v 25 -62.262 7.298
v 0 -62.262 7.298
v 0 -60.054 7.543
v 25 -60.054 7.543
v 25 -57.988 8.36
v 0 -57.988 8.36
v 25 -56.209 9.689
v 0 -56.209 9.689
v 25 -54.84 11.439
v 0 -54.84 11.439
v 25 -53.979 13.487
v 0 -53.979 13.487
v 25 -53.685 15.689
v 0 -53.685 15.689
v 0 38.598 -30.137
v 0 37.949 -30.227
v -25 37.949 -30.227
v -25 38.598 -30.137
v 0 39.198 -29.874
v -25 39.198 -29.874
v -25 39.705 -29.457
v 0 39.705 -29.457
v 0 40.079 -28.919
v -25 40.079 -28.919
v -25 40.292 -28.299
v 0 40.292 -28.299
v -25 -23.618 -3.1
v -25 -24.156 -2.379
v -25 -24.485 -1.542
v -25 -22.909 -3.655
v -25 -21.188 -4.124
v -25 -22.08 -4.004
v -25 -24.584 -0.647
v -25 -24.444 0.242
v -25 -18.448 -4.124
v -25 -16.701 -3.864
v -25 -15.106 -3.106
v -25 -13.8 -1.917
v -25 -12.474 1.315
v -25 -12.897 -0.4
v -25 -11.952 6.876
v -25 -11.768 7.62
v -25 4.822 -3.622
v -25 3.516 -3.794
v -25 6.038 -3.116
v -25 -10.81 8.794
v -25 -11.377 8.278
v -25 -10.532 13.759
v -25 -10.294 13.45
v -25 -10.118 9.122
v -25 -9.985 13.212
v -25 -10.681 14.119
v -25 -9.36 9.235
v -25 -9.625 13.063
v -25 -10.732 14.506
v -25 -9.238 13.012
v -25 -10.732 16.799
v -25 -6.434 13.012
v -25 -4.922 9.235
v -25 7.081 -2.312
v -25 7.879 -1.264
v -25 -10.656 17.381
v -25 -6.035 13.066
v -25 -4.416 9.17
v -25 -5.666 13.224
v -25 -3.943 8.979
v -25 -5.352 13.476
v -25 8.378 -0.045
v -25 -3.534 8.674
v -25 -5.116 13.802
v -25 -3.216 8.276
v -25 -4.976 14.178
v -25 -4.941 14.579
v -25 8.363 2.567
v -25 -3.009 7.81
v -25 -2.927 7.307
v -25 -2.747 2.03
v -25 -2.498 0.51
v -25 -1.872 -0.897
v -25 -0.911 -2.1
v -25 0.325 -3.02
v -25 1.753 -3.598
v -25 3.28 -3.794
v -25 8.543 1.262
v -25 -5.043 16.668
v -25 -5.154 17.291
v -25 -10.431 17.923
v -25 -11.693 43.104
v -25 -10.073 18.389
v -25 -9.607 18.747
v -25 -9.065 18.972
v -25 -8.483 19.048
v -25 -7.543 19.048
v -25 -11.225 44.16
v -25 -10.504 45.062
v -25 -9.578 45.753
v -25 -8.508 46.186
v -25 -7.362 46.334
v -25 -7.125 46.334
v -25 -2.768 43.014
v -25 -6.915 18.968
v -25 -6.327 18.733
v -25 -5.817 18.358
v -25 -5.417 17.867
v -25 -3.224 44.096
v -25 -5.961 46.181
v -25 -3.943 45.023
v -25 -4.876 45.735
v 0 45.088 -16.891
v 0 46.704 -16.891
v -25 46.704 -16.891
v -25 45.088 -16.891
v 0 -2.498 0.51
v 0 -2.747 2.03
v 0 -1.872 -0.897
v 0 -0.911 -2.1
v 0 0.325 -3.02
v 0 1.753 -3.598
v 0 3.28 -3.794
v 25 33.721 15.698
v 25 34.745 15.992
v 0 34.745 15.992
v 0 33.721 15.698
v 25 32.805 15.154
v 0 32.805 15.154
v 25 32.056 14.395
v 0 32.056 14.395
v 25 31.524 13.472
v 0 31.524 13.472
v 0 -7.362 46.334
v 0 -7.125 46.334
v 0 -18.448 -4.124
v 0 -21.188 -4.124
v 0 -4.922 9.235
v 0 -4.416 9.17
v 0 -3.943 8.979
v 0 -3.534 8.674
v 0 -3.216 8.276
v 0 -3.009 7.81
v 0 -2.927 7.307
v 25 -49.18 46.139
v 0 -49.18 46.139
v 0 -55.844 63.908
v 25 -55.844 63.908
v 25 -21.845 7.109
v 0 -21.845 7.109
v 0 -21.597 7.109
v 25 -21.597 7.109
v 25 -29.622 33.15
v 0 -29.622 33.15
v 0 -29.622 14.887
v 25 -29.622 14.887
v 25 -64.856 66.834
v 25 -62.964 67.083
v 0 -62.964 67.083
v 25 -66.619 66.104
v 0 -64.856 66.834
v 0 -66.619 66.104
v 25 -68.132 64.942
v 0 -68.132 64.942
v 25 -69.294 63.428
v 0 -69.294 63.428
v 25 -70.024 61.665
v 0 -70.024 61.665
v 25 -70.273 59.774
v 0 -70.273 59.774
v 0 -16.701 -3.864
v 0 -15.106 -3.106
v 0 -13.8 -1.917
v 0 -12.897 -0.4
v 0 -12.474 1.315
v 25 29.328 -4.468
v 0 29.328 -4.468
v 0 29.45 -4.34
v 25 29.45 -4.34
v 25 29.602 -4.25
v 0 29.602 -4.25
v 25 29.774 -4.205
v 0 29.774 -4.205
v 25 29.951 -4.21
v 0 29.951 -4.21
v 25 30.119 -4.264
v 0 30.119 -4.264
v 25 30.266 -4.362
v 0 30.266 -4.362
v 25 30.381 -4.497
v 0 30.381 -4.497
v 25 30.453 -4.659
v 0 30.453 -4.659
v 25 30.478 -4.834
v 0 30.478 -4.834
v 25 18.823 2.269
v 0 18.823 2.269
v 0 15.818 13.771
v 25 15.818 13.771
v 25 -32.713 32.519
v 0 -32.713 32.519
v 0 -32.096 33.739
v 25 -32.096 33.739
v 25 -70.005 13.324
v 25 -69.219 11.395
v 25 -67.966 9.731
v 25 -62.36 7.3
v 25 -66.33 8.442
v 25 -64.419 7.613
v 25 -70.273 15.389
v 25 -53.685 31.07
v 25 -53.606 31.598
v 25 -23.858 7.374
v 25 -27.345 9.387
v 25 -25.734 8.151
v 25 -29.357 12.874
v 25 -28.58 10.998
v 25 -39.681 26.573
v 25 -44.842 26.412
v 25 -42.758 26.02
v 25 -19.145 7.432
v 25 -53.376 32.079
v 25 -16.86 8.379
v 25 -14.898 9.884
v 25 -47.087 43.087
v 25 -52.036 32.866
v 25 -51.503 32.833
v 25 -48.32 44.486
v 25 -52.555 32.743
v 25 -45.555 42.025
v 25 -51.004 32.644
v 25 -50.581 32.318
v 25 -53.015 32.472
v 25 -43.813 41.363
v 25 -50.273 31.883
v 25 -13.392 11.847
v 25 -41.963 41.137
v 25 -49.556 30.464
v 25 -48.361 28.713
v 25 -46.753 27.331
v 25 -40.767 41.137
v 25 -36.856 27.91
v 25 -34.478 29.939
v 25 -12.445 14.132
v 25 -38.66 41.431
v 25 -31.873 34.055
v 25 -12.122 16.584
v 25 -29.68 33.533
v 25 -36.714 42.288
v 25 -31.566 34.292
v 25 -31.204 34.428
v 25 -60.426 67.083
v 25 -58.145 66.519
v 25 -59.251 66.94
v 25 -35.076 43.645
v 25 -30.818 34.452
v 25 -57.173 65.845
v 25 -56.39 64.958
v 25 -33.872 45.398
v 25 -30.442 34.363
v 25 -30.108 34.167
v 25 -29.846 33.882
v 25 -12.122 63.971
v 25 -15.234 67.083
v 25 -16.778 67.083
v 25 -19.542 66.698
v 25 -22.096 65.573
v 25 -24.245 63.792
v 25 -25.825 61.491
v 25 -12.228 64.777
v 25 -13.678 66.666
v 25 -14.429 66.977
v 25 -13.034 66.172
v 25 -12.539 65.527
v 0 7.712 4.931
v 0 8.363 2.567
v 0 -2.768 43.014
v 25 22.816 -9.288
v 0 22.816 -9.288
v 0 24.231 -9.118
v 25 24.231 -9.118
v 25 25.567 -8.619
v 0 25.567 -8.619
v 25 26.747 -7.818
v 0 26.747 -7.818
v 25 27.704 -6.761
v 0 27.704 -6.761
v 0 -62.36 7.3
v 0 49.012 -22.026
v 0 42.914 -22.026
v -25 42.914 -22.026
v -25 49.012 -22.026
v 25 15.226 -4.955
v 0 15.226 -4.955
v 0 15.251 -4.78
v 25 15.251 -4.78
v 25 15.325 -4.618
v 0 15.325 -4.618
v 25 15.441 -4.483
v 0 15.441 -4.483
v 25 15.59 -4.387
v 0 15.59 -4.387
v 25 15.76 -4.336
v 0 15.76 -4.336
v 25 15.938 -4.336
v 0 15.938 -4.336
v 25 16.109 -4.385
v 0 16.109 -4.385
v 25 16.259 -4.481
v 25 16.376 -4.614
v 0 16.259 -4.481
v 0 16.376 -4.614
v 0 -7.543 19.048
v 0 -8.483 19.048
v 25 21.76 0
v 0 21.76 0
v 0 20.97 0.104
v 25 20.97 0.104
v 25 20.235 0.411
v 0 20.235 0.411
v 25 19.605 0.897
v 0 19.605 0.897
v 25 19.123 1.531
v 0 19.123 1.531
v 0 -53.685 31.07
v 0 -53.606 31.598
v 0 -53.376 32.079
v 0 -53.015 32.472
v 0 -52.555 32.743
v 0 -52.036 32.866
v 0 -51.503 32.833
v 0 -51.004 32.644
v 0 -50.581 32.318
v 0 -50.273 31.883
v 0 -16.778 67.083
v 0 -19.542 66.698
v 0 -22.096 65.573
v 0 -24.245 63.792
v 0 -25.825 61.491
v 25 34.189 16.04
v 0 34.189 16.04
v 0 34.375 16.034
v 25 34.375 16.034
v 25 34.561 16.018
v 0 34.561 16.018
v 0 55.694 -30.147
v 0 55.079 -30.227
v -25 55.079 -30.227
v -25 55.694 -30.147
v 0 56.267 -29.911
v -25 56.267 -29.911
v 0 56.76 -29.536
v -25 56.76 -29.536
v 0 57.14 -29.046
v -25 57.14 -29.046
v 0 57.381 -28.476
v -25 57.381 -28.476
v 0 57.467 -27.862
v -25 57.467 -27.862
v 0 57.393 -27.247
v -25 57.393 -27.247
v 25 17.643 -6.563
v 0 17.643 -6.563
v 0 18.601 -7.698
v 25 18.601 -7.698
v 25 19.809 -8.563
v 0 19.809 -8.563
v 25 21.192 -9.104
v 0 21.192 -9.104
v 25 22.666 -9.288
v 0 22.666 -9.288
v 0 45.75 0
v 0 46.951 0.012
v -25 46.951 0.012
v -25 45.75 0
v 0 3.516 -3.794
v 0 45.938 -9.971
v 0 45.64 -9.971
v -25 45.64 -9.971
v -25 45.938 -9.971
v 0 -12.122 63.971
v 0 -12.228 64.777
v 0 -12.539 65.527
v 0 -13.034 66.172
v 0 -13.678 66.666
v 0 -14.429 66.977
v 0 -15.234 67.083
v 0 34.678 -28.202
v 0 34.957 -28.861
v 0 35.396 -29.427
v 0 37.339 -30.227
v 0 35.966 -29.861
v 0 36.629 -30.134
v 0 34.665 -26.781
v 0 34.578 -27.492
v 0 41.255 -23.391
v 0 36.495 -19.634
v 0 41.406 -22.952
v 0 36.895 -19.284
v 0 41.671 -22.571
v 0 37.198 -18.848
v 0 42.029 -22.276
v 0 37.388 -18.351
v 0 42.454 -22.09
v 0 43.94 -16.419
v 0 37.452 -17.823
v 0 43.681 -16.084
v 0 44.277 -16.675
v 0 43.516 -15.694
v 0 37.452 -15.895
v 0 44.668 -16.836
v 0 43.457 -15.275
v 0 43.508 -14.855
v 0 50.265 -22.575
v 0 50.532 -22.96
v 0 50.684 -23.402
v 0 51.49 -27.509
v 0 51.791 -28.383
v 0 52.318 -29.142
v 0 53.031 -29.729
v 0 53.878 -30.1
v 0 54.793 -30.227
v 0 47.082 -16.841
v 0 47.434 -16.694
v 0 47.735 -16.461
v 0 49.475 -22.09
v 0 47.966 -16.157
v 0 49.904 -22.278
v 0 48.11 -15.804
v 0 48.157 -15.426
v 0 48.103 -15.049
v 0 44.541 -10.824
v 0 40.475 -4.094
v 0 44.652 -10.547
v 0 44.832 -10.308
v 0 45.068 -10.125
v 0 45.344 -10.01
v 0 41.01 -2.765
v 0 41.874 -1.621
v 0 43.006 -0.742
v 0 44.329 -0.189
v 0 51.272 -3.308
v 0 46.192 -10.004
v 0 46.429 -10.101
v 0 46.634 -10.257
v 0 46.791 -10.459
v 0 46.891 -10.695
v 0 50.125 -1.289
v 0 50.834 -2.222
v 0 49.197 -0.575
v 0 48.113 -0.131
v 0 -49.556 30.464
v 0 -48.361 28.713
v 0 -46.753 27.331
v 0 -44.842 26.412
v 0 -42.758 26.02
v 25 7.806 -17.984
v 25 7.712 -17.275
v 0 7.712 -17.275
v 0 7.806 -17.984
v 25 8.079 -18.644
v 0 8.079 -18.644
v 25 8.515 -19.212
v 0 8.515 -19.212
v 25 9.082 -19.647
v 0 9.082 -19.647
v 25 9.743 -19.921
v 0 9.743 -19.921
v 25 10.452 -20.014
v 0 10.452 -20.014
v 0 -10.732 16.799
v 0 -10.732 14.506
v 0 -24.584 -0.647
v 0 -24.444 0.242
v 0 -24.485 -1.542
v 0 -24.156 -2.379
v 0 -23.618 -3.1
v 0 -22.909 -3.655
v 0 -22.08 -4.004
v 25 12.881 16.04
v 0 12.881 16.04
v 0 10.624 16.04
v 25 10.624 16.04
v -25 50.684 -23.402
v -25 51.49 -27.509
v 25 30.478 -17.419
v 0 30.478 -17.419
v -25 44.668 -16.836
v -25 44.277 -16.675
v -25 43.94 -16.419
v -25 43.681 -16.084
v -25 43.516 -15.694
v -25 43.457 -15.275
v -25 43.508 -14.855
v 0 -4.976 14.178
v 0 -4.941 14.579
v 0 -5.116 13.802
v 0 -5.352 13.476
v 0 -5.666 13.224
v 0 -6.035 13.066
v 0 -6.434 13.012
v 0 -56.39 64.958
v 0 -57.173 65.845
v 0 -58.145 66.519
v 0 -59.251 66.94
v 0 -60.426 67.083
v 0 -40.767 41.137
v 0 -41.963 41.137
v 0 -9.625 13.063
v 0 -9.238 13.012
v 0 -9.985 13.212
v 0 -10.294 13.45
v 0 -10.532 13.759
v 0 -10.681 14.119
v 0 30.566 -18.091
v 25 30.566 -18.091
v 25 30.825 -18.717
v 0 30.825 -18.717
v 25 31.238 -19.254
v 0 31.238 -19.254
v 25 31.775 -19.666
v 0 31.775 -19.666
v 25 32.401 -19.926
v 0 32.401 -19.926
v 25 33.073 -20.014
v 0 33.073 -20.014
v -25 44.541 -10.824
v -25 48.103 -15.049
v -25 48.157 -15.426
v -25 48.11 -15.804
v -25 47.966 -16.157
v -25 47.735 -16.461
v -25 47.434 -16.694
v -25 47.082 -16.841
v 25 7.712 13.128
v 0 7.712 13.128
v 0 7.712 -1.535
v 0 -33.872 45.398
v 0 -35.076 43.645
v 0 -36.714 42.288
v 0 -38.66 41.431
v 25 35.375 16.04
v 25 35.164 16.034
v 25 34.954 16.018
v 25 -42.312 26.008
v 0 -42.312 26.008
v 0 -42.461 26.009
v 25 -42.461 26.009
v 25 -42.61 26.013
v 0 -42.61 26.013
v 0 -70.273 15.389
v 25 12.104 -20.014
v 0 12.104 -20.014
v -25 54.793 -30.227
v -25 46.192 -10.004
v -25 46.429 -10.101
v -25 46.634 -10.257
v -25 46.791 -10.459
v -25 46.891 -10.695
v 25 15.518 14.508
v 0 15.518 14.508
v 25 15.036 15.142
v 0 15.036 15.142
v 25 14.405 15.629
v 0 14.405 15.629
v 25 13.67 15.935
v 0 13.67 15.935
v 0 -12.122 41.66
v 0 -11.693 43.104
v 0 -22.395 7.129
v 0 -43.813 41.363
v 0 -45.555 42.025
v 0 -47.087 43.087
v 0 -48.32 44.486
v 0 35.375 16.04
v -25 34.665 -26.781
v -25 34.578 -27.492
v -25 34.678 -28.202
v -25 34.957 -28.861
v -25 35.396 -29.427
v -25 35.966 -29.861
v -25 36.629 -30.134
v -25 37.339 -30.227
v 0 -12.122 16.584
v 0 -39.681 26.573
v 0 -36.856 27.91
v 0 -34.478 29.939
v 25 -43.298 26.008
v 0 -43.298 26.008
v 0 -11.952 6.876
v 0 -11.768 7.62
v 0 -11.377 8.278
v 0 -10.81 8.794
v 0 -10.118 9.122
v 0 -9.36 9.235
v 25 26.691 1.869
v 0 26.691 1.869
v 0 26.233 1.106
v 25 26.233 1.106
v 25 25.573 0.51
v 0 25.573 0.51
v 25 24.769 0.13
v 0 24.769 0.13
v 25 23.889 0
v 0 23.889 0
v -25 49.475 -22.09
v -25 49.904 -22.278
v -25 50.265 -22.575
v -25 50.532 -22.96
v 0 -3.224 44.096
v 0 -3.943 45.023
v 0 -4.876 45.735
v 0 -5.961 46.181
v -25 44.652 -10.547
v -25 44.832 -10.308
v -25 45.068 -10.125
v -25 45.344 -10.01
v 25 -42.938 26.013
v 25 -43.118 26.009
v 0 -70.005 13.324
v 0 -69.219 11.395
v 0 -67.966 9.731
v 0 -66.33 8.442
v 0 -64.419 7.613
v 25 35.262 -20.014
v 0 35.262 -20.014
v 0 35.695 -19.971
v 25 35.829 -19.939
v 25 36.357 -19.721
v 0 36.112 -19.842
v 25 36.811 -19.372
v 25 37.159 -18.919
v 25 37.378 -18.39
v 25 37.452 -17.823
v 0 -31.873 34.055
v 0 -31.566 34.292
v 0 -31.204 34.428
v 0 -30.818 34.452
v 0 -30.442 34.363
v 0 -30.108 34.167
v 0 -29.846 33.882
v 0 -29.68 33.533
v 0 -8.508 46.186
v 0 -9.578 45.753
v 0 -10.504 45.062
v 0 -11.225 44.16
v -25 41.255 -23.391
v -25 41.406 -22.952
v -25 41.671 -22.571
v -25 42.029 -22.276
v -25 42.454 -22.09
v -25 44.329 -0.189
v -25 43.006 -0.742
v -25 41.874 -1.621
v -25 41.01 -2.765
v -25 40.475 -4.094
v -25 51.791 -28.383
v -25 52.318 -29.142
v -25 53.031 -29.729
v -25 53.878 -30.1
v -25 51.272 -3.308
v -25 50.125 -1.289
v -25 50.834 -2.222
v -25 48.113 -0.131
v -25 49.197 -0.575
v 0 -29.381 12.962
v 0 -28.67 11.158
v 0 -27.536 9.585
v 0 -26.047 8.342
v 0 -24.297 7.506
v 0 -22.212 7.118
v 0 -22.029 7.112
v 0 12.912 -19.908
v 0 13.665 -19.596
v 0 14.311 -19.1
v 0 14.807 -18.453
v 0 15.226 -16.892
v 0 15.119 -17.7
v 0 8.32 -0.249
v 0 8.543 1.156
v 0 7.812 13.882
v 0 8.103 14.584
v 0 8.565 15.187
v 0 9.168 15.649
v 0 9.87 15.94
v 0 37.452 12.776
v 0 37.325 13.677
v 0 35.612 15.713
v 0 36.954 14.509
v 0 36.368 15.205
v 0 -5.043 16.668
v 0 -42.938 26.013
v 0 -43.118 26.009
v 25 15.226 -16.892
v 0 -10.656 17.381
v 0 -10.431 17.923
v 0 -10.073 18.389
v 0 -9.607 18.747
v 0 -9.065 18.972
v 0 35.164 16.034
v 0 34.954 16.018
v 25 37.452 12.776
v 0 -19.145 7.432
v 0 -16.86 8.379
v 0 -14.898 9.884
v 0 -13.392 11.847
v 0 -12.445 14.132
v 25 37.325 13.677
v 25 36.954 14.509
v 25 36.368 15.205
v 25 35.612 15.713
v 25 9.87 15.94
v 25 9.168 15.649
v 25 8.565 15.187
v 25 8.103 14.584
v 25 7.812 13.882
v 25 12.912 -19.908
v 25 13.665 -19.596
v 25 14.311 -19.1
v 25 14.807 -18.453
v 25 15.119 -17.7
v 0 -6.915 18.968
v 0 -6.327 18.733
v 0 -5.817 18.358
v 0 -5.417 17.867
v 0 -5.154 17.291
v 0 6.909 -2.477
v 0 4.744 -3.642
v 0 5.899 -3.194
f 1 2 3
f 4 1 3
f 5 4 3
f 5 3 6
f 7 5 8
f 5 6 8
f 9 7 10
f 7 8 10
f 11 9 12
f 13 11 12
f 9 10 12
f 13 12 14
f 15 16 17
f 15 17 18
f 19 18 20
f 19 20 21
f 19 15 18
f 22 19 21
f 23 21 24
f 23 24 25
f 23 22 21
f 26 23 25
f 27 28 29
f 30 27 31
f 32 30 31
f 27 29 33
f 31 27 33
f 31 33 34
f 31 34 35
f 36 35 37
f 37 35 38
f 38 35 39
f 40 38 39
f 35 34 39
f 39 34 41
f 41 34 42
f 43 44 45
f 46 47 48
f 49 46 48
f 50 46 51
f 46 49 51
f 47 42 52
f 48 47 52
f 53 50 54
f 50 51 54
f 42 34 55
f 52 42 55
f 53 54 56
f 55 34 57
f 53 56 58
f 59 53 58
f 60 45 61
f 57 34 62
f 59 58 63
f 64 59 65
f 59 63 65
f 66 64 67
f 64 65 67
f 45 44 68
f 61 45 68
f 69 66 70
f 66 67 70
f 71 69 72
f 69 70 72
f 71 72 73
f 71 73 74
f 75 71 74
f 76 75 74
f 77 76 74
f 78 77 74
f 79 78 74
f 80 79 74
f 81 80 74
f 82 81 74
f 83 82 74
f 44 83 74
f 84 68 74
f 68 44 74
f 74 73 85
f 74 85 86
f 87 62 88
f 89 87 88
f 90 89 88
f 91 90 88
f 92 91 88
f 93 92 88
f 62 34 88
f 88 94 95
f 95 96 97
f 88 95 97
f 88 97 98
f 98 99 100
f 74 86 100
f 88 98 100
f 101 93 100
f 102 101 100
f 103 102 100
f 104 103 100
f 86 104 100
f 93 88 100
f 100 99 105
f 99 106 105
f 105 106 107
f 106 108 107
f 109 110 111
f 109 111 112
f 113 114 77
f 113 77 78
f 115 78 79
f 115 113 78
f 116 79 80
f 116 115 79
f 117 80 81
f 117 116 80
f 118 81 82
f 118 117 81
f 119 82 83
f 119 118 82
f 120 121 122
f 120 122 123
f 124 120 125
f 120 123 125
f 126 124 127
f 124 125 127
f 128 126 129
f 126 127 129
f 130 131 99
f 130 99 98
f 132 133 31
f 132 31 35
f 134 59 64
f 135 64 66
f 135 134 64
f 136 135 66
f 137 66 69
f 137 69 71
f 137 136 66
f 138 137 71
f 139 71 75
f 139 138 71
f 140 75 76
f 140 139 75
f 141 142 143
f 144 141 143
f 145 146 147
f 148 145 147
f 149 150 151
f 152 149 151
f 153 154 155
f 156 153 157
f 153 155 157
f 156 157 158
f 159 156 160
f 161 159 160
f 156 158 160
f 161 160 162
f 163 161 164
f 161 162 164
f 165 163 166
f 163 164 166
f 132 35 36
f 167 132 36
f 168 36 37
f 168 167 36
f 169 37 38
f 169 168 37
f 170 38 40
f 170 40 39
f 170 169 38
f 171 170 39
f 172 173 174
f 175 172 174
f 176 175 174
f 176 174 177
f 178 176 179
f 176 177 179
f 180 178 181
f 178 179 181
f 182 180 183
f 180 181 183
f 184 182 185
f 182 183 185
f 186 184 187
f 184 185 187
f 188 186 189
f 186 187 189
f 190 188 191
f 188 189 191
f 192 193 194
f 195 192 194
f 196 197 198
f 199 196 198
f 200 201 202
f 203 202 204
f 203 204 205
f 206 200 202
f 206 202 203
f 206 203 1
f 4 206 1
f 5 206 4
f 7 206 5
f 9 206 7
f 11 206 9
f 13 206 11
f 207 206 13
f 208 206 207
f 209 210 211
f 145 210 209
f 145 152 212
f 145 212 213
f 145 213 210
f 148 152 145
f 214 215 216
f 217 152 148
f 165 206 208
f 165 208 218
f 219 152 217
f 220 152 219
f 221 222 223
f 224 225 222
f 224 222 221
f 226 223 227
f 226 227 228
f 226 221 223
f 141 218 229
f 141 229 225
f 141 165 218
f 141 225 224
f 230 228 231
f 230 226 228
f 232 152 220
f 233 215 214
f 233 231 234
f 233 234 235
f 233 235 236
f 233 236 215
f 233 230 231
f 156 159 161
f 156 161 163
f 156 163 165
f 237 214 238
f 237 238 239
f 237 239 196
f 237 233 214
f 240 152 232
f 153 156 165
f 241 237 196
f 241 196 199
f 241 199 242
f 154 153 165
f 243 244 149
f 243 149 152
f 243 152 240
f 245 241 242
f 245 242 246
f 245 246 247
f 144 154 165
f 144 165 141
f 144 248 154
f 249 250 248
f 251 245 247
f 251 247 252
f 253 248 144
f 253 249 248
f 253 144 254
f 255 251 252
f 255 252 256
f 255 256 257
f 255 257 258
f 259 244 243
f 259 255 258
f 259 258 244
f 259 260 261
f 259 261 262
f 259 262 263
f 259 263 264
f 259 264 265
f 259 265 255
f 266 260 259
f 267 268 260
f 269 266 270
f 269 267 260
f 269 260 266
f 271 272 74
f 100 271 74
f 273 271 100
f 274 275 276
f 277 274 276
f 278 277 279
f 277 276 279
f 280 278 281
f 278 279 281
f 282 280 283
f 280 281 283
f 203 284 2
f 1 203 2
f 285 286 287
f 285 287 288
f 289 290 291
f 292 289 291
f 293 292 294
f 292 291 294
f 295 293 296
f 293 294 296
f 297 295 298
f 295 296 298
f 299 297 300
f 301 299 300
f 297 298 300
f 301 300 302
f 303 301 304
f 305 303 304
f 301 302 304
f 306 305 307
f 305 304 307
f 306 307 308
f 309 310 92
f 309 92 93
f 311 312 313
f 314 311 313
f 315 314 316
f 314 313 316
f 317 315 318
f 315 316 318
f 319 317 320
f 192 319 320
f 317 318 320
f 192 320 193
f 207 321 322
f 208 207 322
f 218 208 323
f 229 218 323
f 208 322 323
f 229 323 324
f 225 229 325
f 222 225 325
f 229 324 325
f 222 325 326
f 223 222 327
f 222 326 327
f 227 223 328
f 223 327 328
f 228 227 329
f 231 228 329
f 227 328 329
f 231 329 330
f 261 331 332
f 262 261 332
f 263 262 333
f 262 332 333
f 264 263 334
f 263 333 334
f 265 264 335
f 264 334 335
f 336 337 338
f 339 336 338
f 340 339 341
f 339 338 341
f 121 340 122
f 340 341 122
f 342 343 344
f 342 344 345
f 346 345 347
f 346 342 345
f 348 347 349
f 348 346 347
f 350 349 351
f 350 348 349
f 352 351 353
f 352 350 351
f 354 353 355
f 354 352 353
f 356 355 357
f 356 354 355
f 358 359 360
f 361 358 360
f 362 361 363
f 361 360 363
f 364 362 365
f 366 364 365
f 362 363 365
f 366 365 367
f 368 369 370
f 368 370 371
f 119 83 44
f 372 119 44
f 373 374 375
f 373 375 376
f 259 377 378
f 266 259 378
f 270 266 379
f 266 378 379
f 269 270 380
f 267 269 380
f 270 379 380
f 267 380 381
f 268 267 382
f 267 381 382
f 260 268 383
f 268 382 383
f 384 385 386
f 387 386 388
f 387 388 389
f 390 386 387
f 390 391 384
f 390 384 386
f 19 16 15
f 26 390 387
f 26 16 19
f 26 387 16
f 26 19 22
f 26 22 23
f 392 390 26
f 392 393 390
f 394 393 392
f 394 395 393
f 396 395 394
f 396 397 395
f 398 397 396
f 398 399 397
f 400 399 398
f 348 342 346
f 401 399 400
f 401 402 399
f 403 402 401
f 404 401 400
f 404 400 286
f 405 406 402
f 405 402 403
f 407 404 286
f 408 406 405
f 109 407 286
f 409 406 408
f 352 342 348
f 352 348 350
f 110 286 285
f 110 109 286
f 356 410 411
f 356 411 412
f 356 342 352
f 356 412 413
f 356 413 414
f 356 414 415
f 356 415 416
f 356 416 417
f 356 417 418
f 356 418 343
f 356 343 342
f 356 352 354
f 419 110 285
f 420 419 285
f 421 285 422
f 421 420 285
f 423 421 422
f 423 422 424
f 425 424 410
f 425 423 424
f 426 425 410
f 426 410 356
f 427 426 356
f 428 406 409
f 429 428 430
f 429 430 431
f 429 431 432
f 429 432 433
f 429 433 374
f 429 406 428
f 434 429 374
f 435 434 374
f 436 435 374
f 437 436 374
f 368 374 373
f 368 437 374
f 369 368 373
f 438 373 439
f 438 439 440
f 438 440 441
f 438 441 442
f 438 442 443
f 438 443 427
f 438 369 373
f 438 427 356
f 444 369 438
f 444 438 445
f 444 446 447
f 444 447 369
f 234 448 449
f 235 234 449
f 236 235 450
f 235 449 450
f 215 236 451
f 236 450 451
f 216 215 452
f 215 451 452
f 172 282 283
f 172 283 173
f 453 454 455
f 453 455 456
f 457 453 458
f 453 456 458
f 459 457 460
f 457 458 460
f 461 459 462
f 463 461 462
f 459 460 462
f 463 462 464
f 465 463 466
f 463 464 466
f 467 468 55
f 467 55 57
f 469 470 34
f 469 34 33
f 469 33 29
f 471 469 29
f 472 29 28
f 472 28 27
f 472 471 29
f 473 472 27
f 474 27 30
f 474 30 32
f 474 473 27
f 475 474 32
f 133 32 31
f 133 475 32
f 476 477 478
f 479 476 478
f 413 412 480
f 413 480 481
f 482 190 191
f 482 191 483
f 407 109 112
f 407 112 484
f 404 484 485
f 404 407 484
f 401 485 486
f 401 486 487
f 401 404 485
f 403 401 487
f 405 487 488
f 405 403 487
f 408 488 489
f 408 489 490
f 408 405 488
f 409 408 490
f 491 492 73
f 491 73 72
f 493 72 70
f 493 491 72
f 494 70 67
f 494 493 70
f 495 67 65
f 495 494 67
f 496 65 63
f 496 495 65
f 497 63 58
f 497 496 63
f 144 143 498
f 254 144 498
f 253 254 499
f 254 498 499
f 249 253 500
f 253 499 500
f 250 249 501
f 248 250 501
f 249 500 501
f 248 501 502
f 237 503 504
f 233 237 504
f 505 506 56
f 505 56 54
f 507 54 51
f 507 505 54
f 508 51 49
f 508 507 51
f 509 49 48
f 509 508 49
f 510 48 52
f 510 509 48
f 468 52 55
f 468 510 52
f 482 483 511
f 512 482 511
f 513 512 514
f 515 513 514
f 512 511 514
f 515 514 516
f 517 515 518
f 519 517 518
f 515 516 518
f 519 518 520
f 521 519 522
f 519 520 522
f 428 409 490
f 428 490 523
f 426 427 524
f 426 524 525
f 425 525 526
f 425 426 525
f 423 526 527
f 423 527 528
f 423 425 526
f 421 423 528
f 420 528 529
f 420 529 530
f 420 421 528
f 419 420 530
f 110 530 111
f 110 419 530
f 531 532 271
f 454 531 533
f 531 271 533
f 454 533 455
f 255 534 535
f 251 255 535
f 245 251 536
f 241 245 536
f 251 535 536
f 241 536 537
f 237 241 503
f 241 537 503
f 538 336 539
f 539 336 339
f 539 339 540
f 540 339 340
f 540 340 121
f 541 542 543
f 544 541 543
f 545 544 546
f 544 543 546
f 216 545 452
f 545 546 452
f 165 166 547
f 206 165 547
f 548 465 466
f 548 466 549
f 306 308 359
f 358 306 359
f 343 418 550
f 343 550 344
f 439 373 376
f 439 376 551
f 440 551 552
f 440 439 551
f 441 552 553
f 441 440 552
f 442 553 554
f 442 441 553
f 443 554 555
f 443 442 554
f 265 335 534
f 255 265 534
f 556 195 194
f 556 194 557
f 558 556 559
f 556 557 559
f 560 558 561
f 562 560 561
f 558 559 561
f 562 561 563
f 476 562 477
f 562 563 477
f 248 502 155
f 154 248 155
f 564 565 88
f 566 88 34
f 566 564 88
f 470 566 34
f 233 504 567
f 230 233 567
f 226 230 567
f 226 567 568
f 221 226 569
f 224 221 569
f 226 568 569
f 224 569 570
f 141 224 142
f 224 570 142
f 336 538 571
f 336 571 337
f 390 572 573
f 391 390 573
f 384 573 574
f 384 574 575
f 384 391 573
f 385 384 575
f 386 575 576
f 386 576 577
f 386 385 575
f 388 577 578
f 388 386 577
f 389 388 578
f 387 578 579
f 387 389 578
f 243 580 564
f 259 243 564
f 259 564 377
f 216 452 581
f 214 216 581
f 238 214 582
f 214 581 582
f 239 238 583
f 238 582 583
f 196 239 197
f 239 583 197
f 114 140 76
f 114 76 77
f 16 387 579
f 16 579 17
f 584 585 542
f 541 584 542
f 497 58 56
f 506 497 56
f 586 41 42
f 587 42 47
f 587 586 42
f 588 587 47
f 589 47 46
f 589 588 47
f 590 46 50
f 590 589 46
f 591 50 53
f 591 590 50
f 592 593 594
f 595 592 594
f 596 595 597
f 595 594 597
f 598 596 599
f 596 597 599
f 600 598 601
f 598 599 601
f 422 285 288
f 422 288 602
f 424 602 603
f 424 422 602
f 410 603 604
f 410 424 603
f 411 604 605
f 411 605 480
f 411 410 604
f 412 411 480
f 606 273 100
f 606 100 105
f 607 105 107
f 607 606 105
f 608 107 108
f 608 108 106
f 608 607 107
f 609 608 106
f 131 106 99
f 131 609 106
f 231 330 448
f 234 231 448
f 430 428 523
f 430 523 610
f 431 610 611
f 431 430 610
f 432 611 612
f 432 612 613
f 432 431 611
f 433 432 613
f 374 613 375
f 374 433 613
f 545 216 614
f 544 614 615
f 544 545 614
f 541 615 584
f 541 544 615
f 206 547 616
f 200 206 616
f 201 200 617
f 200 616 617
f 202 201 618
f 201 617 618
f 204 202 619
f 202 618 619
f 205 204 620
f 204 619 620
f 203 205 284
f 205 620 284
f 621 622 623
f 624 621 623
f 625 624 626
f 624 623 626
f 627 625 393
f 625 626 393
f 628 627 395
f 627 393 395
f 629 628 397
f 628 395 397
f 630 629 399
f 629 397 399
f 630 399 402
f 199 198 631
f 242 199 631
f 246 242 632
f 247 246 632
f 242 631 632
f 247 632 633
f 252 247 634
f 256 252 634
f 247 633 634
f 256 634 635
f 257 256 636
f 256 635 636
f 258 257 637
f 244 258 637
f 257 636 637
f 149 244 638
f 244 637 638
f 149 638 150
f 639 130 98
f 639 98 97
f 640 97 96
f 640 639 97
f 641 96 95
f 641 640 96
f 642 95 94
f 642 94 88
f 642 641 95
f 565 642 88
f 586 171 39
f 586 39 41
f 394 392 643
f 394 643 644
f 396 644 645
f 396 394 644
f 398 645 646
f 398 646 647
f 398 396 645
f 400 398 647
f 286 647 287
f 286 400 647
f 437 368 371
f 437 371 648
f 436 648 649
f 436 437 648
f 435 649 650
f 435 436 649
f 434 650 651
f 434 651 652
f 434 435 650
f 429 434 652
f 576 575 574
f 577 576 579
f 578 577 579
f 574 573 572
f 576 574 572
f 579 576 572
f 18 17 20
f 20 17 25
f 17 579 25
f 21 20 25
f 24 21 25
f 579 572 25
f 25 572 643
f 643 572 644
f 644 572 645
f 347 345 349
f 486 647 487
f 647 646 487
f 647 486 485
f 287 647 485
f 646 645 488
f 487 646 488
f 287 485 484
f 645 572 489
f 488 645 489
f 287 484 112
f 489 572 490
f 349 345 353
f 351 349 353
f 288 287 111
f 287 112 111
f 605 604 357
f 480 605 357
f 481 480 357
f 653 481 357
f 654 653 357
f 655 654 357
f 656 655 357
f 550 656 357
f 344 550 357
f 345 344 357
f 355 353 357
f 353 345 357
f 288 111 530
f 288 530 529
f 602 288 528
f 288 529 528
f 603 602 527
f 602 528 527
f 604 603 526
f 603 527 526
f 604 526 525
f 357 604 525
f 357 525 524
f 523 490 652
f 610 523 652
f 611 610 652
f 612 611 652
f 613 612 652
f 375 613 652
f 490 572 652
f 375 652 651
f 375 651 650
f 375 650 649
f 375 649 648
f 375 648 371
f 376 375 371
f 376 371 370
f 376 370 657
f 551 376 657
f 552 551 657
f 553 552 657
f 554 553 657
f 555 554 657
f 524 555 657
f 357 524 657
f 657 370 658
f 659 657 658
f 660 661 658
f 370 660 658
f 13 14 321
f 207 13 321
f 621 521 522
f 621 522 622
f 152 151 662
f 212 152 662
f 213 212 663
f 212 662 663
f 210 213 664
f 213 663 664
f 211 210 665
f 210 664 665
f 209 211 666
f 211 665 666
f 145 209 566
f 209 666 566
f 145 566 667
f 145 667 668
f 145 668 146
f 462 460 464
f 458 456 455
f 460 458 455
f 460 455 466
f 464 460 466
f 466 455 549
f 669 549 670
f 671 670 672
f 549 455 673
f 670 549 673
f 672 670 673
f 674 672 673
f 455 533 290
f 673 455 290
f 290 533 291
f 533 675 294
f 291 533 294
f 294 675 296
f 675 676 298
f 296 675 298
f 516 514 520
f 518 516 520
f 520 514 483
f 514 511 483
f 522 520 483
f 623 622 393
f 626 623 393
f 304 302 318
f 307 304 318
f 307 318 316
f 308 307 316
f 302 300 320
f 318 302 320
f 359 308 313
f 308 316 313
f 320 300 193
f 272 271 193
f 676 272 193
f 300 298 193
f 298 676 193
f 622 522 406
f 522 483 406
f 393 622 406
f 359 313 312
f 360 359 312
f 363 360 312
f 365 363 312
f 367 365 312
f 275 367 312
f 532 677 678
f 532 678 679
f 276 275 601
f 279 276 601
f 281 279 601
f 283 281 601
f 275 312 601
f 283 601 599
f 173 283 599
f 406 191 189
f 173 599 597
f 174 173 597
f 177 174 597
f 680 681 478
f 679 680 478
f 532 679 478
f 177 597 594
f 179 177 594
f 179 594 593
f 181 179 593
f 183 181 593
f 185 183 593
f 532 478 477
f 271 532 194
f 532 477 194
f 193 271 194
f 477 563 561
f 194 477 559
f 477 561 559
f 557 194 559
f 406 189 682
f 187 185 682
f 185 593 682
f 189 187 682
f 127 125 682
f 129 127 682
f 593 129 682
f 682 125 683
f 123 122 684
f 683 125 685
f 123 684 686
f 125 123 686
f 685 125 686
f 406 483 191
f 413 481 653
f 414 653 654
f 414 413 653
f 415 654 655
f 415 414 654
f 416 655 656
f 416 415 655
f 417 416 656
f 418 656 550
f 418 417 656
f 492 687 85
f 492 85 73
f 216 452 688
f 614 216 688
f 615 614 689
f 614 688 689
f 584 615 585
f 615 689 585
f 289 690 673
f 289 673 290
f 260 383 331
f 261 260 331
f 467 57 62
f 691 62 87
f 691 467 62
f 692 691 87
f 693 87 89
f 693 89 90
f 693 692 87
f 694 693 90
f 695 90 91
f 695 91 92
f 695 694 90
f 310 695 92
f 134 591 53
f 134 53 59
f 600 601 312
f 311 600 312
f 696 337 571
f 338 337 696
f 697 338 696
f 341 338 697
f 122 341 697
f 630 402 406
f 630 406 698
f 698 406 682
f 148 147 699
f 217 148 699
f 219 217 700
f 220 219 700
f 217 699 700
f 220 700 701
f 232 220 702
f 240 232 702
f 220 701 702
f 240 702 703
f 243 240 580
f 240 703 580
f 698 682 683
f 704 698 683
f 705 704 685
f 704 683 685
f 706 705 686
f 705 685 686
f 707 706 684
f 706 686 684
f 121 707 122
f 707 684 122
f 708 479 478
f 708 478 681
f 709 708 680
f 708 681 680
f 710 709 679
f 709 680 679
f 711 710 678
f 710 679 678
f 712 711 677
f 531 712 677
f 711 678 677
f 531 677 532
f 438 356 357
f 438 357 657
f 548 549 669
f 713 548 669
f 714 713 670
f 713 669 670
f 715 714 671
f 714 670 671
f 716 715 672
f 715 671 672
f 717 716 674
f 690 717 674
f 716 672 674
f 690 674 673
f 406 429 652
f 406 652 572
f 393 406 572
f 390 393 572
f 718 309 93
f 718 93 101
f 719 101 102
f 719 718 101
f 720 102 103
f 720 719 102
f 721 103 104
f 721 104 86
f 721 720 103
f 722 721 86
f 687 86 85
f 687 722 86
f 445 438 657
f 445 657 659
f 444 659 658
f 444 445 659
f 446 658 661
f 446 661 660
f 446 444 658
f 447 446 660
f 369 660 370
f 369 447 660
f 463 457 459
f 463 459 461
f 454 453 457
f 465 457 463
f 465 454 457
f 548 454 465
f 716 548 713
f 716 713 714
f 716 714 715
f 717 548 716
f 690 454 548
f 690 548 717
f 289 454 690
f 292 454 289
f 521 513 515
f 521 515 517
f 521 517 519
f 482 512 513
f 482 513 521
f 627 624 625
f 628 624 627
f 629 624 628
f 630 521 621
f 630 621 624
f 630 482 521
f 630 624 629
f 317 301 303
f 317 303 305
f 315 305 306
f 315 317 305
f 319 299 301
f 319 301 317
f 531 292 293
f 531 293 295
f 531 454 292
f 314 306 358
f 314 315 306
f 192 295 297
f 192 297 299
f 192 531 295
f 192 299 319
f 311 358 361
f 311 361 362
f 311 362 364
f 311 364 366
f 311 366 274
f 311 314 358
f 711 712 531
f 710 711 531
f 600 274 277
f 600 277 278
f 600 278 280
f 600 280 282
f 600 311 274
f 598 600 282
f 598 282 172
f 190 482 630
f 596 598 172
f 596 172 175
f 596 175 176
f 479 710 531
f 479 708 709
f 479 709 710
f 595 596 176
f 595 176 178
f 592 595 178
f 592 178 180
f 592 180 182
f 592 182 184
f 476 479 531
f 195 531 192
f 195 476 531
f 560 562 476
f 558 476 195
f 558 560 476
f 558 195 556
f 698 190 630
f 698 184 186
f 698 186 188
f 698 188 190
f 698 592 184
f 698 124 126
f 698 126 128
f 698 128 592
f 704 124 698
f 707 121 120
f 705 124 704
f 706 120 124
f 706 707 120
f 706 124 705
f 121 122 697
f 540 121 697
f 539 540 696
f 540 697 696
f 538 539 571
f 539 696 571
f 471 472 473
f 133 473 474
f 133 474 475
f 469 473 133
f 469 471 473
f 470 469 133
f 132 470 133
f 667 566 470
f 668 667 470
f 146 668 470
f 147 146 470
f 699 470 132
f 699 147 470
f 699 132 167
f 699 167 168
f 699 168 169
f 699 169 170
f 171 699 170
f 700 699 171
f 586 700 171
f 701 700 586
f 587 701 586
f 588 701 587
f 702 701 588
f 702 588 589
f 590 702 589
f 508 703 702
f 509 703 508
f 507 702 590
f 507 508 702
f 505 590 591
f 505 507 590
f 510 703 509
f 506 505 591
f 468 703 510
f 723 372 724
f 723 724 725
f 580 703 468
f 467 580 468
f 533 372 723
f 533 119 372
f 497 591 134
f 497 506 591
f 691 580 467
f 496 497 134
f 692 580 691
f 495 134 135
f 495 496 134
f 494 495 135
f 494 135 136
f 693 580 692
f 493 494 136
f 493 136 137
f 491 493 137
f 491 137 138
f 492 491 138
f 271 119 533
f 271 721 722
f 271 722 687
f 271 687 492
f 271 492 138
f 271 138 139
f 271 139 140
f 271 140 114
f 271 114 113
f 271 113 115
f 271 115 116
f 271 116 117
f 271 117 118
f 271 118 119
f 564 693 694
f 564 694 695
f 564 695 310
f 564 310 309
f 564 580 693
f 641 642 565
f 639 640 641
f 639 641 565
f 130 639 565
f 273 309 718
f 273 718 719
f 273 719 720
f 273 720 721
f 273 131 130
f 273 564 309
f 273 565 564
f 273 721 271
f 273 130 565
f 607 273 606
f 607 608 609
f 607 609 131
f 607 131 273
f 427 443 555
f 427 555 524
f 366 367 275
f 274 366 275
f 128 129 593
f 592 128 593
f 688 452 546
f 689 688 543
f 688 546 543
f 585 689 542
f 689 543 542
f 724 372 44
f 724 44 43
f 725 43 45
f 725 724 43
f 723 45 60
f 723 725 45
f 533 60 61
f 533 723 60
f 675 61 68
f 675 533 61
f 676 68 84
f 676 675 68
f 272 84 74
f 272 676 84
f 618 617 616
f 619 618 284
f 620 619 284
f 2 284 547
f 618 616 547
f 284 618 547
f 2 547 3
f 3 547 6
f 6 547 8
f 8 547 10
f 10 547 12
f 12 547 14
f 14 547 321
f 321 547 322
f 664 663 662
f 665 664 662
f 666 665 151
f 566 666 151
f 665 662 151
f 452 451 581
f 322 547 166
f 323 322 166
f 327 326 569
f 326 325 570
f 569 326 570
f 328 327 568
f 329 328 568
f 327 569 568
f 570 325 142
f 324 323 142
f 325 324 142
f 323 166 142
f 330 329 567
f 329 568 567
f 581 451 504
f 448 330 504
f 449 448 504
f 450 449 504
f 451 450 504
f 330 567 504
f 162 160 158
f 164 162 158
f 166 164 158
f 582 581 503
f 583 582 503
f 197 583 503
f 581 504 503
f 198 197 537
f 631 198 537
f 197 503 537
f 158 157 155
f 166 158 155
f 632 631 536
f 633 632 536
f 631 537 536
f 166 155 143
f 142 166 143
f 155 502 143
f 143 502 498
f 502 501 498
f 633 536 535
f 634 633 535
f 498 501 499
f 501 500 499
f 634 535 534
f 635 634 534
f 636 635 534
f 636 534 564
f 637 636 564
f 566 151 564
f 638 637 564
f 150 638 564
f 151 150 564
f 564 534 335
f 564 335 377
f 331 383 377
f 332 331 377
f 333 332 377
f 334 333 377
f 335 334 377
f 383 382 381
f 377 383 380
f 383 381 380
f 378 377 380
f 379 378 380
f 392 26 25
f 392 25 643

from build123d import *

# Parameters (mm, degrees)
F1_DEPTH = 25
F3_DEPTH = 25
F5_DEPTH = 25
F7_DEPTH = 25


with BuildPart() as f1:
    # F0 (on Right) → F1 (new body)
    with BuildSketch(Plane.YZ):
        with BuildLine():
            ThreePointArc((-42.312005, 26.007977), (-42.535172, 26.011046), (-42.75817, 26.02025))
            ThreePointArc((-42.75817, 26.02025), (-43.027788, 26.011045), (-43.297546, 26.007977))
            Line((-43.297546, 26.007977), (-42.312005, 26.007977))
        make_face()
        with BuildLine():
            Line((-70.273437, 59.773509), (-70.273437, 15.388939))
            ThreePointArc((-70.273437, 15.388939), (-67.966195, 9.731049), (-62.360368, 7.300045))
            Line((-62.360368, 7.300045), (-62.26204, 7.297884))
            ThreePointArc((-62.26204, 7.297884), (-56.208633, 9.689187), (-53.684898, 15.688589))
            Line((-53.684898, 15.688589), (-53.684898, 31.070014))
            ThreePointArc((-53.684898, 31.070014), (-52.299912, 32.823773), (-50.272896, 31.882995))
            Line((-50.272896, 31.882995), (-49.556091, 30.464213))
            ThreePointArc((-49.556091, 30.464213), (-46.752973, 27.330773), (-42.75817, 26.02025))
            ThreePointArc((-42.75817, 26.02025), (-36.855957, 27.910036), (-32.713019, 32.519103))
            Line((-32.713019, 32.519103), (-32.096468, 33.739451))
            ThreePointArc((-32.096468, 33.739451), (-30.626661, 34.421618), (-29.622396, 33.149951))
            Line((-29.622396, 33.149951), (-29.622396, 14.886579))
            ThreePointArc((-29.622396, 14.886579), (-27.344506, 9.387266), (-21.845192, 7.109375))
            Line((-21.845192, 7.109375), (-21.597221, 7.109375))
            ThreePointArc((-21.597221, 7.109375), (-14.897508, 9.884487), (-12.122396, 16.5842))
            Line((-12.122396, 16.5842), (-12.122396, 63.971421))
            ThreePointArc((-12.122396, 63.971421), (-13.033855, 66.171878), (-15.234312, 67.083336))
            Line((-15.234312, 67.083336), (-16.777582, 67.083336))
            ThreePointArc((-16.777582, 67.083336), (-22.095797, 65.572543), (-25.82547, 61.491434))
            Line((-25.82547, 61.491434), (-33.872003, 45.398368))
            ThreePointArc((-33.872003, 45.398368), (-36.714132, 42.288434), (-40.766779, 41.137162))
            Line((-40.766779, 41.137162), (-41.962627, 41.137162))
            ThreePointArc((-41.962627, 41.137162), (-46.353402, 42.509865), (-49.180409, 46.139088))
            Line((-49.180409, 46.139088), (-55.843828, 63.908203))
            ThreePointArc((-55.843828, 63.908203), (-57.638361, 66.211969), (-60.425547, 67.083336))
            Line((-60.425547, 67.083336), (-62.963609, 67.083336))
            ThreePointArc((-62.963609, 67.083336), (-68.132438, 64.942337), (-70.273437, 59.773509))
        make_face()
    extrude(amount=F1_DEPTH)

    # F2 (on Right) → F3 (join)
    with BuildSketch(Plane.YZ):
        with BuildLine():
            Line((-7.124937, 46.333829), (-7.36219, 46.333829))
            ThreePointArc((-7.36219, 46.333829), (-10.063572, 45.437381), (-11.693057, 43.103744))
            Line((-11.693057, 43.103744), (-24.443611, 0.241975))
            ThreePointArc((-24.443611, 0.241975), (-23.910683, -2.757462), (-21.187712, -4.123502))
            Line((-21.187712, -4.123502), (-18.448257, -4.123502))
            ThreePointArc((-18.448257, -4.123502), (-14.408923, -2.560225), (-12.474373, 1.315026))
            Line((-12.474373, 1.315026), (-11.9515, 6.875921))
            ThreePointArc((-11.9515, 6.875921), (-11.112334, 8.556922), (-9.360157, 9.235038))
            Line((-9.360157, 9.235038), (-4.921758, 9.235038))
            ThreePointArc((-4.921758, 9.235038), (-3.534337, 8.674148), (-2.926506, 7.306641))
            Line((-2.926506, 7.306641), (-2.746653, 2.030499))
            ThreePointArc((-2.746653, 2.030499), (-0.910619, -2.100235), (3.280267, -3.794477))
            Line((3.280267, -3.794477), (3.515583, -3.794477))
            ThreePointArc((3.515583, -3.794477), (7.514666, -1.813932), (8.363068, 2.567329))
            Line((8.363068, 2.567329), (-2.768474, 43.014349))
            ThreePointArc((-2.768474, 43.014349), (-4.386428, 45.409393), (-7.124937, 46.333829))
        make_face()
        with BuildLine():
            Line((-10.732168, 14.506254), (-10.732168, 16.798608))
            ThreePointArc((-10.732168, 16.798608), (-10.073272, 18.389324), (-8.482557, 19.04822))
            Line((-8.482557, 19.04822), (-7.542723, 19.04822))
            ThreePointArc((-7.542723, 19.04822), (-5.816858, 18.357859), (-5.043229, 16.66768))
            Line((-5.043229, 16.66768), (-4.941344, 14.579062))
            ThreePointArc((-4.941344, 14.579062), (-5.351816, 13.47566), (-6.433909, 13.011915))
            Line((-6.433909, 13.011915), (-9.237829, 13.011915))
            ThreePointArc((-9.237829, 13.011915), (-10.294487, 13.449596), (-10.732168, 14.506254))
        make_face(mode=Mode.SUBTRACT)
    extrude(amount=-F3_DEPTH)

    # F4 (on Right) → F5 (join)
    with BuildSketch(Plane.YZ):
        with BuildLine():
            ThreePointArc((34.18857, 16.039507), (34.467843, 16.027538), (34.745067, 15.991716))
            ThreePointArc((34.745067, 15.991716), (35.058963, 16.027542), (35.37467, 16.039507))
            Line((35.37467, 16.039507), (34.18857, 16.039507))
        make_face()
        with BuildLine():
            Line((7.712483, 13.128328), (7.712483, -17.274895))
            ThreePointArc((7.712483, -17.274895), (8.514778, -19.211805), (10.451688, -20.0141))
            Line((10.451688, -20.0141), (12.103662, -20.0141))
            ThreePointArc((12.103662, -20.0141), (14.311225, -19.099697), (15.225627, -16.892135))
            Line((15.225627, -16.892135), (15.225627, -4.95546))
            ThreePointArc((15.225627, -4.95546), (15.673394, -4.355624), (16.375787, -4.614359))
            Line((16.375787, -4.614359), (17.643087, -6.563044))
            ThreePointArc((17.643087, -6.563044), (19.80853, -8.562795), (22.66552, -9.287882))
            Line((22.66552, -9.287882), (22.815599, -9.287882))
            ThreePointArc((22.815599, -9.287882), (25.567106, -8.61867), (27.703921, -6.760539))
            Line((27.703921, -6.760539), (29.32815, -4.468306))
            ThreePointArc((29.32815, -4.468306), (30.036787, -4.231068), (30.477826, -4.834336))
            Line((30.477826, -4.834336), (30.477826, -17.419205))
            ThreePointArc((30.477826, -17.419205), (31.237853, -19.254073), (33.07272, -20.0141))
            Line((33.07272, -20.0141), (35.261726, -20.0141))
            ThreePointArc((35.261726, -20.0141), (36.810801, -19.372452), (37.452448, -17.823378))
            Line((37.452448, -17.823378), (37.452448, 12.77563))
            ThreePointArc((37.452448, 12.77563), (36.685492, 14.8776), (34.745067, 15.991716))
            ThreePointArc((34.745067, 15.991716), (32.804703, 15.153718), (31.524237, 13.472154))
            Line((31.524237, 13.472154), (26.691334, 1.868516))
            ThreePointArc((26.691334, 1.868516), (25.573071, 0.509963), (23.888994, 0))
            Line((23.888994, 0), (21.759759, 0))
            ThreePointArc((21.759759, 0), (19.904163, 0.633155), (18.822613, 2.268505))
            Line((18.822613, 2.268505), (15.818161, 13.771002))
            ThreePointArc((15.818161, 13.771002), (14.73661, 15.406352), (12.881014, 16.039507))
            Line((12.881014, 16.039507), (10.623663, 16.039507))
            ThreePointArc((10.623663, 16.039507), (8.565148, 15.186843), (7.712483, 13.128328))
        make_face()
    extrude(amount=F5_DEPTH)

    # F6 (on Right) → F7 (join)
    with BuildSketch(Plane.YZ):
        with BuildLine():
            Line((40.474585, -4.094413), (34.664634, -26.780793))
            ThreePointArc((34.664634, -26.780793), (35.158235, -29.158759), (37.339398, -30.226883))
            Line((37.339398, -30.226883), (37.948593, -30.226883))
            ThreePointArc((37.948593, -30.226883), (39.465997, -29.682855), (40.292074, -28.298629))
            Line((40.292074, -28.298629), (41.255346, -23.390523))
            ThreePointArc((41.255346, -23.390523), (41.839937, -22.410947), (42.91376, -22.025954))
            Line((42.91376, -22.025954), (49.011535, -22.025954))
            ThreePointArc((49.011535, -22.025954), (50.094433, -22.4142), (50.683964, -23.402054))
            Line((50.683964, -23.402054), (51.489984, -27.508913))
            ThreePointArc((51.489984, -27.508913), (52.654382, -29.460048), (54.79324, -30.226883))
            Line((54.79324, -30.226883), (55.079278, -30.226883))
            ThreePointArc((55.079278, -30.226883), (56.965589, -29.30337), (57.393027, -27.247077))
            Line((57.393027, -27.247077), (51.271783, -3.307557))
            ThreePointArc((51.271783, -3.307557), (49.684894, -0.90122), (46.950989, 0.012254))
            Line((46.950989, 0.012254), (45.749709, 0))
            ThreePointArc((45.749709, 0), (42.410878, -1.143713), (40.474585, -4.094413))
        make_face()
        with BuildLine():
            ThreePointArc((45.088106, -16.89079), (43.799738, -16.259871), (43.508178, -14.855256))
            Line((43.508178, -14.855256), (44.540585, -10.823966))
            ThreePointArc((44.540585, -10.823966), (44.944057, -10.209119), (45.639781, -9.970799))
            Line((45.639781, -9.970799), (45.937924, -9.970799))
            ThreePointArc((45.937924, -9.970799), (46.536573, -10.172391), (46.891338, -10.69504))
            Line((46.891338, -10.69504), (48.103382, -15.048624))
            ThreePointArc((48.103382, -15.048624), (47.860716, -16.31687), (46.704019, -16.89079))
            Line((46.704019, -16.89079), (45.088106, -16.89079))
        make_face(mode=Mode.SUBTRACT)
    extrude(amount=-F7_DEPTH)


solid = f1.part
